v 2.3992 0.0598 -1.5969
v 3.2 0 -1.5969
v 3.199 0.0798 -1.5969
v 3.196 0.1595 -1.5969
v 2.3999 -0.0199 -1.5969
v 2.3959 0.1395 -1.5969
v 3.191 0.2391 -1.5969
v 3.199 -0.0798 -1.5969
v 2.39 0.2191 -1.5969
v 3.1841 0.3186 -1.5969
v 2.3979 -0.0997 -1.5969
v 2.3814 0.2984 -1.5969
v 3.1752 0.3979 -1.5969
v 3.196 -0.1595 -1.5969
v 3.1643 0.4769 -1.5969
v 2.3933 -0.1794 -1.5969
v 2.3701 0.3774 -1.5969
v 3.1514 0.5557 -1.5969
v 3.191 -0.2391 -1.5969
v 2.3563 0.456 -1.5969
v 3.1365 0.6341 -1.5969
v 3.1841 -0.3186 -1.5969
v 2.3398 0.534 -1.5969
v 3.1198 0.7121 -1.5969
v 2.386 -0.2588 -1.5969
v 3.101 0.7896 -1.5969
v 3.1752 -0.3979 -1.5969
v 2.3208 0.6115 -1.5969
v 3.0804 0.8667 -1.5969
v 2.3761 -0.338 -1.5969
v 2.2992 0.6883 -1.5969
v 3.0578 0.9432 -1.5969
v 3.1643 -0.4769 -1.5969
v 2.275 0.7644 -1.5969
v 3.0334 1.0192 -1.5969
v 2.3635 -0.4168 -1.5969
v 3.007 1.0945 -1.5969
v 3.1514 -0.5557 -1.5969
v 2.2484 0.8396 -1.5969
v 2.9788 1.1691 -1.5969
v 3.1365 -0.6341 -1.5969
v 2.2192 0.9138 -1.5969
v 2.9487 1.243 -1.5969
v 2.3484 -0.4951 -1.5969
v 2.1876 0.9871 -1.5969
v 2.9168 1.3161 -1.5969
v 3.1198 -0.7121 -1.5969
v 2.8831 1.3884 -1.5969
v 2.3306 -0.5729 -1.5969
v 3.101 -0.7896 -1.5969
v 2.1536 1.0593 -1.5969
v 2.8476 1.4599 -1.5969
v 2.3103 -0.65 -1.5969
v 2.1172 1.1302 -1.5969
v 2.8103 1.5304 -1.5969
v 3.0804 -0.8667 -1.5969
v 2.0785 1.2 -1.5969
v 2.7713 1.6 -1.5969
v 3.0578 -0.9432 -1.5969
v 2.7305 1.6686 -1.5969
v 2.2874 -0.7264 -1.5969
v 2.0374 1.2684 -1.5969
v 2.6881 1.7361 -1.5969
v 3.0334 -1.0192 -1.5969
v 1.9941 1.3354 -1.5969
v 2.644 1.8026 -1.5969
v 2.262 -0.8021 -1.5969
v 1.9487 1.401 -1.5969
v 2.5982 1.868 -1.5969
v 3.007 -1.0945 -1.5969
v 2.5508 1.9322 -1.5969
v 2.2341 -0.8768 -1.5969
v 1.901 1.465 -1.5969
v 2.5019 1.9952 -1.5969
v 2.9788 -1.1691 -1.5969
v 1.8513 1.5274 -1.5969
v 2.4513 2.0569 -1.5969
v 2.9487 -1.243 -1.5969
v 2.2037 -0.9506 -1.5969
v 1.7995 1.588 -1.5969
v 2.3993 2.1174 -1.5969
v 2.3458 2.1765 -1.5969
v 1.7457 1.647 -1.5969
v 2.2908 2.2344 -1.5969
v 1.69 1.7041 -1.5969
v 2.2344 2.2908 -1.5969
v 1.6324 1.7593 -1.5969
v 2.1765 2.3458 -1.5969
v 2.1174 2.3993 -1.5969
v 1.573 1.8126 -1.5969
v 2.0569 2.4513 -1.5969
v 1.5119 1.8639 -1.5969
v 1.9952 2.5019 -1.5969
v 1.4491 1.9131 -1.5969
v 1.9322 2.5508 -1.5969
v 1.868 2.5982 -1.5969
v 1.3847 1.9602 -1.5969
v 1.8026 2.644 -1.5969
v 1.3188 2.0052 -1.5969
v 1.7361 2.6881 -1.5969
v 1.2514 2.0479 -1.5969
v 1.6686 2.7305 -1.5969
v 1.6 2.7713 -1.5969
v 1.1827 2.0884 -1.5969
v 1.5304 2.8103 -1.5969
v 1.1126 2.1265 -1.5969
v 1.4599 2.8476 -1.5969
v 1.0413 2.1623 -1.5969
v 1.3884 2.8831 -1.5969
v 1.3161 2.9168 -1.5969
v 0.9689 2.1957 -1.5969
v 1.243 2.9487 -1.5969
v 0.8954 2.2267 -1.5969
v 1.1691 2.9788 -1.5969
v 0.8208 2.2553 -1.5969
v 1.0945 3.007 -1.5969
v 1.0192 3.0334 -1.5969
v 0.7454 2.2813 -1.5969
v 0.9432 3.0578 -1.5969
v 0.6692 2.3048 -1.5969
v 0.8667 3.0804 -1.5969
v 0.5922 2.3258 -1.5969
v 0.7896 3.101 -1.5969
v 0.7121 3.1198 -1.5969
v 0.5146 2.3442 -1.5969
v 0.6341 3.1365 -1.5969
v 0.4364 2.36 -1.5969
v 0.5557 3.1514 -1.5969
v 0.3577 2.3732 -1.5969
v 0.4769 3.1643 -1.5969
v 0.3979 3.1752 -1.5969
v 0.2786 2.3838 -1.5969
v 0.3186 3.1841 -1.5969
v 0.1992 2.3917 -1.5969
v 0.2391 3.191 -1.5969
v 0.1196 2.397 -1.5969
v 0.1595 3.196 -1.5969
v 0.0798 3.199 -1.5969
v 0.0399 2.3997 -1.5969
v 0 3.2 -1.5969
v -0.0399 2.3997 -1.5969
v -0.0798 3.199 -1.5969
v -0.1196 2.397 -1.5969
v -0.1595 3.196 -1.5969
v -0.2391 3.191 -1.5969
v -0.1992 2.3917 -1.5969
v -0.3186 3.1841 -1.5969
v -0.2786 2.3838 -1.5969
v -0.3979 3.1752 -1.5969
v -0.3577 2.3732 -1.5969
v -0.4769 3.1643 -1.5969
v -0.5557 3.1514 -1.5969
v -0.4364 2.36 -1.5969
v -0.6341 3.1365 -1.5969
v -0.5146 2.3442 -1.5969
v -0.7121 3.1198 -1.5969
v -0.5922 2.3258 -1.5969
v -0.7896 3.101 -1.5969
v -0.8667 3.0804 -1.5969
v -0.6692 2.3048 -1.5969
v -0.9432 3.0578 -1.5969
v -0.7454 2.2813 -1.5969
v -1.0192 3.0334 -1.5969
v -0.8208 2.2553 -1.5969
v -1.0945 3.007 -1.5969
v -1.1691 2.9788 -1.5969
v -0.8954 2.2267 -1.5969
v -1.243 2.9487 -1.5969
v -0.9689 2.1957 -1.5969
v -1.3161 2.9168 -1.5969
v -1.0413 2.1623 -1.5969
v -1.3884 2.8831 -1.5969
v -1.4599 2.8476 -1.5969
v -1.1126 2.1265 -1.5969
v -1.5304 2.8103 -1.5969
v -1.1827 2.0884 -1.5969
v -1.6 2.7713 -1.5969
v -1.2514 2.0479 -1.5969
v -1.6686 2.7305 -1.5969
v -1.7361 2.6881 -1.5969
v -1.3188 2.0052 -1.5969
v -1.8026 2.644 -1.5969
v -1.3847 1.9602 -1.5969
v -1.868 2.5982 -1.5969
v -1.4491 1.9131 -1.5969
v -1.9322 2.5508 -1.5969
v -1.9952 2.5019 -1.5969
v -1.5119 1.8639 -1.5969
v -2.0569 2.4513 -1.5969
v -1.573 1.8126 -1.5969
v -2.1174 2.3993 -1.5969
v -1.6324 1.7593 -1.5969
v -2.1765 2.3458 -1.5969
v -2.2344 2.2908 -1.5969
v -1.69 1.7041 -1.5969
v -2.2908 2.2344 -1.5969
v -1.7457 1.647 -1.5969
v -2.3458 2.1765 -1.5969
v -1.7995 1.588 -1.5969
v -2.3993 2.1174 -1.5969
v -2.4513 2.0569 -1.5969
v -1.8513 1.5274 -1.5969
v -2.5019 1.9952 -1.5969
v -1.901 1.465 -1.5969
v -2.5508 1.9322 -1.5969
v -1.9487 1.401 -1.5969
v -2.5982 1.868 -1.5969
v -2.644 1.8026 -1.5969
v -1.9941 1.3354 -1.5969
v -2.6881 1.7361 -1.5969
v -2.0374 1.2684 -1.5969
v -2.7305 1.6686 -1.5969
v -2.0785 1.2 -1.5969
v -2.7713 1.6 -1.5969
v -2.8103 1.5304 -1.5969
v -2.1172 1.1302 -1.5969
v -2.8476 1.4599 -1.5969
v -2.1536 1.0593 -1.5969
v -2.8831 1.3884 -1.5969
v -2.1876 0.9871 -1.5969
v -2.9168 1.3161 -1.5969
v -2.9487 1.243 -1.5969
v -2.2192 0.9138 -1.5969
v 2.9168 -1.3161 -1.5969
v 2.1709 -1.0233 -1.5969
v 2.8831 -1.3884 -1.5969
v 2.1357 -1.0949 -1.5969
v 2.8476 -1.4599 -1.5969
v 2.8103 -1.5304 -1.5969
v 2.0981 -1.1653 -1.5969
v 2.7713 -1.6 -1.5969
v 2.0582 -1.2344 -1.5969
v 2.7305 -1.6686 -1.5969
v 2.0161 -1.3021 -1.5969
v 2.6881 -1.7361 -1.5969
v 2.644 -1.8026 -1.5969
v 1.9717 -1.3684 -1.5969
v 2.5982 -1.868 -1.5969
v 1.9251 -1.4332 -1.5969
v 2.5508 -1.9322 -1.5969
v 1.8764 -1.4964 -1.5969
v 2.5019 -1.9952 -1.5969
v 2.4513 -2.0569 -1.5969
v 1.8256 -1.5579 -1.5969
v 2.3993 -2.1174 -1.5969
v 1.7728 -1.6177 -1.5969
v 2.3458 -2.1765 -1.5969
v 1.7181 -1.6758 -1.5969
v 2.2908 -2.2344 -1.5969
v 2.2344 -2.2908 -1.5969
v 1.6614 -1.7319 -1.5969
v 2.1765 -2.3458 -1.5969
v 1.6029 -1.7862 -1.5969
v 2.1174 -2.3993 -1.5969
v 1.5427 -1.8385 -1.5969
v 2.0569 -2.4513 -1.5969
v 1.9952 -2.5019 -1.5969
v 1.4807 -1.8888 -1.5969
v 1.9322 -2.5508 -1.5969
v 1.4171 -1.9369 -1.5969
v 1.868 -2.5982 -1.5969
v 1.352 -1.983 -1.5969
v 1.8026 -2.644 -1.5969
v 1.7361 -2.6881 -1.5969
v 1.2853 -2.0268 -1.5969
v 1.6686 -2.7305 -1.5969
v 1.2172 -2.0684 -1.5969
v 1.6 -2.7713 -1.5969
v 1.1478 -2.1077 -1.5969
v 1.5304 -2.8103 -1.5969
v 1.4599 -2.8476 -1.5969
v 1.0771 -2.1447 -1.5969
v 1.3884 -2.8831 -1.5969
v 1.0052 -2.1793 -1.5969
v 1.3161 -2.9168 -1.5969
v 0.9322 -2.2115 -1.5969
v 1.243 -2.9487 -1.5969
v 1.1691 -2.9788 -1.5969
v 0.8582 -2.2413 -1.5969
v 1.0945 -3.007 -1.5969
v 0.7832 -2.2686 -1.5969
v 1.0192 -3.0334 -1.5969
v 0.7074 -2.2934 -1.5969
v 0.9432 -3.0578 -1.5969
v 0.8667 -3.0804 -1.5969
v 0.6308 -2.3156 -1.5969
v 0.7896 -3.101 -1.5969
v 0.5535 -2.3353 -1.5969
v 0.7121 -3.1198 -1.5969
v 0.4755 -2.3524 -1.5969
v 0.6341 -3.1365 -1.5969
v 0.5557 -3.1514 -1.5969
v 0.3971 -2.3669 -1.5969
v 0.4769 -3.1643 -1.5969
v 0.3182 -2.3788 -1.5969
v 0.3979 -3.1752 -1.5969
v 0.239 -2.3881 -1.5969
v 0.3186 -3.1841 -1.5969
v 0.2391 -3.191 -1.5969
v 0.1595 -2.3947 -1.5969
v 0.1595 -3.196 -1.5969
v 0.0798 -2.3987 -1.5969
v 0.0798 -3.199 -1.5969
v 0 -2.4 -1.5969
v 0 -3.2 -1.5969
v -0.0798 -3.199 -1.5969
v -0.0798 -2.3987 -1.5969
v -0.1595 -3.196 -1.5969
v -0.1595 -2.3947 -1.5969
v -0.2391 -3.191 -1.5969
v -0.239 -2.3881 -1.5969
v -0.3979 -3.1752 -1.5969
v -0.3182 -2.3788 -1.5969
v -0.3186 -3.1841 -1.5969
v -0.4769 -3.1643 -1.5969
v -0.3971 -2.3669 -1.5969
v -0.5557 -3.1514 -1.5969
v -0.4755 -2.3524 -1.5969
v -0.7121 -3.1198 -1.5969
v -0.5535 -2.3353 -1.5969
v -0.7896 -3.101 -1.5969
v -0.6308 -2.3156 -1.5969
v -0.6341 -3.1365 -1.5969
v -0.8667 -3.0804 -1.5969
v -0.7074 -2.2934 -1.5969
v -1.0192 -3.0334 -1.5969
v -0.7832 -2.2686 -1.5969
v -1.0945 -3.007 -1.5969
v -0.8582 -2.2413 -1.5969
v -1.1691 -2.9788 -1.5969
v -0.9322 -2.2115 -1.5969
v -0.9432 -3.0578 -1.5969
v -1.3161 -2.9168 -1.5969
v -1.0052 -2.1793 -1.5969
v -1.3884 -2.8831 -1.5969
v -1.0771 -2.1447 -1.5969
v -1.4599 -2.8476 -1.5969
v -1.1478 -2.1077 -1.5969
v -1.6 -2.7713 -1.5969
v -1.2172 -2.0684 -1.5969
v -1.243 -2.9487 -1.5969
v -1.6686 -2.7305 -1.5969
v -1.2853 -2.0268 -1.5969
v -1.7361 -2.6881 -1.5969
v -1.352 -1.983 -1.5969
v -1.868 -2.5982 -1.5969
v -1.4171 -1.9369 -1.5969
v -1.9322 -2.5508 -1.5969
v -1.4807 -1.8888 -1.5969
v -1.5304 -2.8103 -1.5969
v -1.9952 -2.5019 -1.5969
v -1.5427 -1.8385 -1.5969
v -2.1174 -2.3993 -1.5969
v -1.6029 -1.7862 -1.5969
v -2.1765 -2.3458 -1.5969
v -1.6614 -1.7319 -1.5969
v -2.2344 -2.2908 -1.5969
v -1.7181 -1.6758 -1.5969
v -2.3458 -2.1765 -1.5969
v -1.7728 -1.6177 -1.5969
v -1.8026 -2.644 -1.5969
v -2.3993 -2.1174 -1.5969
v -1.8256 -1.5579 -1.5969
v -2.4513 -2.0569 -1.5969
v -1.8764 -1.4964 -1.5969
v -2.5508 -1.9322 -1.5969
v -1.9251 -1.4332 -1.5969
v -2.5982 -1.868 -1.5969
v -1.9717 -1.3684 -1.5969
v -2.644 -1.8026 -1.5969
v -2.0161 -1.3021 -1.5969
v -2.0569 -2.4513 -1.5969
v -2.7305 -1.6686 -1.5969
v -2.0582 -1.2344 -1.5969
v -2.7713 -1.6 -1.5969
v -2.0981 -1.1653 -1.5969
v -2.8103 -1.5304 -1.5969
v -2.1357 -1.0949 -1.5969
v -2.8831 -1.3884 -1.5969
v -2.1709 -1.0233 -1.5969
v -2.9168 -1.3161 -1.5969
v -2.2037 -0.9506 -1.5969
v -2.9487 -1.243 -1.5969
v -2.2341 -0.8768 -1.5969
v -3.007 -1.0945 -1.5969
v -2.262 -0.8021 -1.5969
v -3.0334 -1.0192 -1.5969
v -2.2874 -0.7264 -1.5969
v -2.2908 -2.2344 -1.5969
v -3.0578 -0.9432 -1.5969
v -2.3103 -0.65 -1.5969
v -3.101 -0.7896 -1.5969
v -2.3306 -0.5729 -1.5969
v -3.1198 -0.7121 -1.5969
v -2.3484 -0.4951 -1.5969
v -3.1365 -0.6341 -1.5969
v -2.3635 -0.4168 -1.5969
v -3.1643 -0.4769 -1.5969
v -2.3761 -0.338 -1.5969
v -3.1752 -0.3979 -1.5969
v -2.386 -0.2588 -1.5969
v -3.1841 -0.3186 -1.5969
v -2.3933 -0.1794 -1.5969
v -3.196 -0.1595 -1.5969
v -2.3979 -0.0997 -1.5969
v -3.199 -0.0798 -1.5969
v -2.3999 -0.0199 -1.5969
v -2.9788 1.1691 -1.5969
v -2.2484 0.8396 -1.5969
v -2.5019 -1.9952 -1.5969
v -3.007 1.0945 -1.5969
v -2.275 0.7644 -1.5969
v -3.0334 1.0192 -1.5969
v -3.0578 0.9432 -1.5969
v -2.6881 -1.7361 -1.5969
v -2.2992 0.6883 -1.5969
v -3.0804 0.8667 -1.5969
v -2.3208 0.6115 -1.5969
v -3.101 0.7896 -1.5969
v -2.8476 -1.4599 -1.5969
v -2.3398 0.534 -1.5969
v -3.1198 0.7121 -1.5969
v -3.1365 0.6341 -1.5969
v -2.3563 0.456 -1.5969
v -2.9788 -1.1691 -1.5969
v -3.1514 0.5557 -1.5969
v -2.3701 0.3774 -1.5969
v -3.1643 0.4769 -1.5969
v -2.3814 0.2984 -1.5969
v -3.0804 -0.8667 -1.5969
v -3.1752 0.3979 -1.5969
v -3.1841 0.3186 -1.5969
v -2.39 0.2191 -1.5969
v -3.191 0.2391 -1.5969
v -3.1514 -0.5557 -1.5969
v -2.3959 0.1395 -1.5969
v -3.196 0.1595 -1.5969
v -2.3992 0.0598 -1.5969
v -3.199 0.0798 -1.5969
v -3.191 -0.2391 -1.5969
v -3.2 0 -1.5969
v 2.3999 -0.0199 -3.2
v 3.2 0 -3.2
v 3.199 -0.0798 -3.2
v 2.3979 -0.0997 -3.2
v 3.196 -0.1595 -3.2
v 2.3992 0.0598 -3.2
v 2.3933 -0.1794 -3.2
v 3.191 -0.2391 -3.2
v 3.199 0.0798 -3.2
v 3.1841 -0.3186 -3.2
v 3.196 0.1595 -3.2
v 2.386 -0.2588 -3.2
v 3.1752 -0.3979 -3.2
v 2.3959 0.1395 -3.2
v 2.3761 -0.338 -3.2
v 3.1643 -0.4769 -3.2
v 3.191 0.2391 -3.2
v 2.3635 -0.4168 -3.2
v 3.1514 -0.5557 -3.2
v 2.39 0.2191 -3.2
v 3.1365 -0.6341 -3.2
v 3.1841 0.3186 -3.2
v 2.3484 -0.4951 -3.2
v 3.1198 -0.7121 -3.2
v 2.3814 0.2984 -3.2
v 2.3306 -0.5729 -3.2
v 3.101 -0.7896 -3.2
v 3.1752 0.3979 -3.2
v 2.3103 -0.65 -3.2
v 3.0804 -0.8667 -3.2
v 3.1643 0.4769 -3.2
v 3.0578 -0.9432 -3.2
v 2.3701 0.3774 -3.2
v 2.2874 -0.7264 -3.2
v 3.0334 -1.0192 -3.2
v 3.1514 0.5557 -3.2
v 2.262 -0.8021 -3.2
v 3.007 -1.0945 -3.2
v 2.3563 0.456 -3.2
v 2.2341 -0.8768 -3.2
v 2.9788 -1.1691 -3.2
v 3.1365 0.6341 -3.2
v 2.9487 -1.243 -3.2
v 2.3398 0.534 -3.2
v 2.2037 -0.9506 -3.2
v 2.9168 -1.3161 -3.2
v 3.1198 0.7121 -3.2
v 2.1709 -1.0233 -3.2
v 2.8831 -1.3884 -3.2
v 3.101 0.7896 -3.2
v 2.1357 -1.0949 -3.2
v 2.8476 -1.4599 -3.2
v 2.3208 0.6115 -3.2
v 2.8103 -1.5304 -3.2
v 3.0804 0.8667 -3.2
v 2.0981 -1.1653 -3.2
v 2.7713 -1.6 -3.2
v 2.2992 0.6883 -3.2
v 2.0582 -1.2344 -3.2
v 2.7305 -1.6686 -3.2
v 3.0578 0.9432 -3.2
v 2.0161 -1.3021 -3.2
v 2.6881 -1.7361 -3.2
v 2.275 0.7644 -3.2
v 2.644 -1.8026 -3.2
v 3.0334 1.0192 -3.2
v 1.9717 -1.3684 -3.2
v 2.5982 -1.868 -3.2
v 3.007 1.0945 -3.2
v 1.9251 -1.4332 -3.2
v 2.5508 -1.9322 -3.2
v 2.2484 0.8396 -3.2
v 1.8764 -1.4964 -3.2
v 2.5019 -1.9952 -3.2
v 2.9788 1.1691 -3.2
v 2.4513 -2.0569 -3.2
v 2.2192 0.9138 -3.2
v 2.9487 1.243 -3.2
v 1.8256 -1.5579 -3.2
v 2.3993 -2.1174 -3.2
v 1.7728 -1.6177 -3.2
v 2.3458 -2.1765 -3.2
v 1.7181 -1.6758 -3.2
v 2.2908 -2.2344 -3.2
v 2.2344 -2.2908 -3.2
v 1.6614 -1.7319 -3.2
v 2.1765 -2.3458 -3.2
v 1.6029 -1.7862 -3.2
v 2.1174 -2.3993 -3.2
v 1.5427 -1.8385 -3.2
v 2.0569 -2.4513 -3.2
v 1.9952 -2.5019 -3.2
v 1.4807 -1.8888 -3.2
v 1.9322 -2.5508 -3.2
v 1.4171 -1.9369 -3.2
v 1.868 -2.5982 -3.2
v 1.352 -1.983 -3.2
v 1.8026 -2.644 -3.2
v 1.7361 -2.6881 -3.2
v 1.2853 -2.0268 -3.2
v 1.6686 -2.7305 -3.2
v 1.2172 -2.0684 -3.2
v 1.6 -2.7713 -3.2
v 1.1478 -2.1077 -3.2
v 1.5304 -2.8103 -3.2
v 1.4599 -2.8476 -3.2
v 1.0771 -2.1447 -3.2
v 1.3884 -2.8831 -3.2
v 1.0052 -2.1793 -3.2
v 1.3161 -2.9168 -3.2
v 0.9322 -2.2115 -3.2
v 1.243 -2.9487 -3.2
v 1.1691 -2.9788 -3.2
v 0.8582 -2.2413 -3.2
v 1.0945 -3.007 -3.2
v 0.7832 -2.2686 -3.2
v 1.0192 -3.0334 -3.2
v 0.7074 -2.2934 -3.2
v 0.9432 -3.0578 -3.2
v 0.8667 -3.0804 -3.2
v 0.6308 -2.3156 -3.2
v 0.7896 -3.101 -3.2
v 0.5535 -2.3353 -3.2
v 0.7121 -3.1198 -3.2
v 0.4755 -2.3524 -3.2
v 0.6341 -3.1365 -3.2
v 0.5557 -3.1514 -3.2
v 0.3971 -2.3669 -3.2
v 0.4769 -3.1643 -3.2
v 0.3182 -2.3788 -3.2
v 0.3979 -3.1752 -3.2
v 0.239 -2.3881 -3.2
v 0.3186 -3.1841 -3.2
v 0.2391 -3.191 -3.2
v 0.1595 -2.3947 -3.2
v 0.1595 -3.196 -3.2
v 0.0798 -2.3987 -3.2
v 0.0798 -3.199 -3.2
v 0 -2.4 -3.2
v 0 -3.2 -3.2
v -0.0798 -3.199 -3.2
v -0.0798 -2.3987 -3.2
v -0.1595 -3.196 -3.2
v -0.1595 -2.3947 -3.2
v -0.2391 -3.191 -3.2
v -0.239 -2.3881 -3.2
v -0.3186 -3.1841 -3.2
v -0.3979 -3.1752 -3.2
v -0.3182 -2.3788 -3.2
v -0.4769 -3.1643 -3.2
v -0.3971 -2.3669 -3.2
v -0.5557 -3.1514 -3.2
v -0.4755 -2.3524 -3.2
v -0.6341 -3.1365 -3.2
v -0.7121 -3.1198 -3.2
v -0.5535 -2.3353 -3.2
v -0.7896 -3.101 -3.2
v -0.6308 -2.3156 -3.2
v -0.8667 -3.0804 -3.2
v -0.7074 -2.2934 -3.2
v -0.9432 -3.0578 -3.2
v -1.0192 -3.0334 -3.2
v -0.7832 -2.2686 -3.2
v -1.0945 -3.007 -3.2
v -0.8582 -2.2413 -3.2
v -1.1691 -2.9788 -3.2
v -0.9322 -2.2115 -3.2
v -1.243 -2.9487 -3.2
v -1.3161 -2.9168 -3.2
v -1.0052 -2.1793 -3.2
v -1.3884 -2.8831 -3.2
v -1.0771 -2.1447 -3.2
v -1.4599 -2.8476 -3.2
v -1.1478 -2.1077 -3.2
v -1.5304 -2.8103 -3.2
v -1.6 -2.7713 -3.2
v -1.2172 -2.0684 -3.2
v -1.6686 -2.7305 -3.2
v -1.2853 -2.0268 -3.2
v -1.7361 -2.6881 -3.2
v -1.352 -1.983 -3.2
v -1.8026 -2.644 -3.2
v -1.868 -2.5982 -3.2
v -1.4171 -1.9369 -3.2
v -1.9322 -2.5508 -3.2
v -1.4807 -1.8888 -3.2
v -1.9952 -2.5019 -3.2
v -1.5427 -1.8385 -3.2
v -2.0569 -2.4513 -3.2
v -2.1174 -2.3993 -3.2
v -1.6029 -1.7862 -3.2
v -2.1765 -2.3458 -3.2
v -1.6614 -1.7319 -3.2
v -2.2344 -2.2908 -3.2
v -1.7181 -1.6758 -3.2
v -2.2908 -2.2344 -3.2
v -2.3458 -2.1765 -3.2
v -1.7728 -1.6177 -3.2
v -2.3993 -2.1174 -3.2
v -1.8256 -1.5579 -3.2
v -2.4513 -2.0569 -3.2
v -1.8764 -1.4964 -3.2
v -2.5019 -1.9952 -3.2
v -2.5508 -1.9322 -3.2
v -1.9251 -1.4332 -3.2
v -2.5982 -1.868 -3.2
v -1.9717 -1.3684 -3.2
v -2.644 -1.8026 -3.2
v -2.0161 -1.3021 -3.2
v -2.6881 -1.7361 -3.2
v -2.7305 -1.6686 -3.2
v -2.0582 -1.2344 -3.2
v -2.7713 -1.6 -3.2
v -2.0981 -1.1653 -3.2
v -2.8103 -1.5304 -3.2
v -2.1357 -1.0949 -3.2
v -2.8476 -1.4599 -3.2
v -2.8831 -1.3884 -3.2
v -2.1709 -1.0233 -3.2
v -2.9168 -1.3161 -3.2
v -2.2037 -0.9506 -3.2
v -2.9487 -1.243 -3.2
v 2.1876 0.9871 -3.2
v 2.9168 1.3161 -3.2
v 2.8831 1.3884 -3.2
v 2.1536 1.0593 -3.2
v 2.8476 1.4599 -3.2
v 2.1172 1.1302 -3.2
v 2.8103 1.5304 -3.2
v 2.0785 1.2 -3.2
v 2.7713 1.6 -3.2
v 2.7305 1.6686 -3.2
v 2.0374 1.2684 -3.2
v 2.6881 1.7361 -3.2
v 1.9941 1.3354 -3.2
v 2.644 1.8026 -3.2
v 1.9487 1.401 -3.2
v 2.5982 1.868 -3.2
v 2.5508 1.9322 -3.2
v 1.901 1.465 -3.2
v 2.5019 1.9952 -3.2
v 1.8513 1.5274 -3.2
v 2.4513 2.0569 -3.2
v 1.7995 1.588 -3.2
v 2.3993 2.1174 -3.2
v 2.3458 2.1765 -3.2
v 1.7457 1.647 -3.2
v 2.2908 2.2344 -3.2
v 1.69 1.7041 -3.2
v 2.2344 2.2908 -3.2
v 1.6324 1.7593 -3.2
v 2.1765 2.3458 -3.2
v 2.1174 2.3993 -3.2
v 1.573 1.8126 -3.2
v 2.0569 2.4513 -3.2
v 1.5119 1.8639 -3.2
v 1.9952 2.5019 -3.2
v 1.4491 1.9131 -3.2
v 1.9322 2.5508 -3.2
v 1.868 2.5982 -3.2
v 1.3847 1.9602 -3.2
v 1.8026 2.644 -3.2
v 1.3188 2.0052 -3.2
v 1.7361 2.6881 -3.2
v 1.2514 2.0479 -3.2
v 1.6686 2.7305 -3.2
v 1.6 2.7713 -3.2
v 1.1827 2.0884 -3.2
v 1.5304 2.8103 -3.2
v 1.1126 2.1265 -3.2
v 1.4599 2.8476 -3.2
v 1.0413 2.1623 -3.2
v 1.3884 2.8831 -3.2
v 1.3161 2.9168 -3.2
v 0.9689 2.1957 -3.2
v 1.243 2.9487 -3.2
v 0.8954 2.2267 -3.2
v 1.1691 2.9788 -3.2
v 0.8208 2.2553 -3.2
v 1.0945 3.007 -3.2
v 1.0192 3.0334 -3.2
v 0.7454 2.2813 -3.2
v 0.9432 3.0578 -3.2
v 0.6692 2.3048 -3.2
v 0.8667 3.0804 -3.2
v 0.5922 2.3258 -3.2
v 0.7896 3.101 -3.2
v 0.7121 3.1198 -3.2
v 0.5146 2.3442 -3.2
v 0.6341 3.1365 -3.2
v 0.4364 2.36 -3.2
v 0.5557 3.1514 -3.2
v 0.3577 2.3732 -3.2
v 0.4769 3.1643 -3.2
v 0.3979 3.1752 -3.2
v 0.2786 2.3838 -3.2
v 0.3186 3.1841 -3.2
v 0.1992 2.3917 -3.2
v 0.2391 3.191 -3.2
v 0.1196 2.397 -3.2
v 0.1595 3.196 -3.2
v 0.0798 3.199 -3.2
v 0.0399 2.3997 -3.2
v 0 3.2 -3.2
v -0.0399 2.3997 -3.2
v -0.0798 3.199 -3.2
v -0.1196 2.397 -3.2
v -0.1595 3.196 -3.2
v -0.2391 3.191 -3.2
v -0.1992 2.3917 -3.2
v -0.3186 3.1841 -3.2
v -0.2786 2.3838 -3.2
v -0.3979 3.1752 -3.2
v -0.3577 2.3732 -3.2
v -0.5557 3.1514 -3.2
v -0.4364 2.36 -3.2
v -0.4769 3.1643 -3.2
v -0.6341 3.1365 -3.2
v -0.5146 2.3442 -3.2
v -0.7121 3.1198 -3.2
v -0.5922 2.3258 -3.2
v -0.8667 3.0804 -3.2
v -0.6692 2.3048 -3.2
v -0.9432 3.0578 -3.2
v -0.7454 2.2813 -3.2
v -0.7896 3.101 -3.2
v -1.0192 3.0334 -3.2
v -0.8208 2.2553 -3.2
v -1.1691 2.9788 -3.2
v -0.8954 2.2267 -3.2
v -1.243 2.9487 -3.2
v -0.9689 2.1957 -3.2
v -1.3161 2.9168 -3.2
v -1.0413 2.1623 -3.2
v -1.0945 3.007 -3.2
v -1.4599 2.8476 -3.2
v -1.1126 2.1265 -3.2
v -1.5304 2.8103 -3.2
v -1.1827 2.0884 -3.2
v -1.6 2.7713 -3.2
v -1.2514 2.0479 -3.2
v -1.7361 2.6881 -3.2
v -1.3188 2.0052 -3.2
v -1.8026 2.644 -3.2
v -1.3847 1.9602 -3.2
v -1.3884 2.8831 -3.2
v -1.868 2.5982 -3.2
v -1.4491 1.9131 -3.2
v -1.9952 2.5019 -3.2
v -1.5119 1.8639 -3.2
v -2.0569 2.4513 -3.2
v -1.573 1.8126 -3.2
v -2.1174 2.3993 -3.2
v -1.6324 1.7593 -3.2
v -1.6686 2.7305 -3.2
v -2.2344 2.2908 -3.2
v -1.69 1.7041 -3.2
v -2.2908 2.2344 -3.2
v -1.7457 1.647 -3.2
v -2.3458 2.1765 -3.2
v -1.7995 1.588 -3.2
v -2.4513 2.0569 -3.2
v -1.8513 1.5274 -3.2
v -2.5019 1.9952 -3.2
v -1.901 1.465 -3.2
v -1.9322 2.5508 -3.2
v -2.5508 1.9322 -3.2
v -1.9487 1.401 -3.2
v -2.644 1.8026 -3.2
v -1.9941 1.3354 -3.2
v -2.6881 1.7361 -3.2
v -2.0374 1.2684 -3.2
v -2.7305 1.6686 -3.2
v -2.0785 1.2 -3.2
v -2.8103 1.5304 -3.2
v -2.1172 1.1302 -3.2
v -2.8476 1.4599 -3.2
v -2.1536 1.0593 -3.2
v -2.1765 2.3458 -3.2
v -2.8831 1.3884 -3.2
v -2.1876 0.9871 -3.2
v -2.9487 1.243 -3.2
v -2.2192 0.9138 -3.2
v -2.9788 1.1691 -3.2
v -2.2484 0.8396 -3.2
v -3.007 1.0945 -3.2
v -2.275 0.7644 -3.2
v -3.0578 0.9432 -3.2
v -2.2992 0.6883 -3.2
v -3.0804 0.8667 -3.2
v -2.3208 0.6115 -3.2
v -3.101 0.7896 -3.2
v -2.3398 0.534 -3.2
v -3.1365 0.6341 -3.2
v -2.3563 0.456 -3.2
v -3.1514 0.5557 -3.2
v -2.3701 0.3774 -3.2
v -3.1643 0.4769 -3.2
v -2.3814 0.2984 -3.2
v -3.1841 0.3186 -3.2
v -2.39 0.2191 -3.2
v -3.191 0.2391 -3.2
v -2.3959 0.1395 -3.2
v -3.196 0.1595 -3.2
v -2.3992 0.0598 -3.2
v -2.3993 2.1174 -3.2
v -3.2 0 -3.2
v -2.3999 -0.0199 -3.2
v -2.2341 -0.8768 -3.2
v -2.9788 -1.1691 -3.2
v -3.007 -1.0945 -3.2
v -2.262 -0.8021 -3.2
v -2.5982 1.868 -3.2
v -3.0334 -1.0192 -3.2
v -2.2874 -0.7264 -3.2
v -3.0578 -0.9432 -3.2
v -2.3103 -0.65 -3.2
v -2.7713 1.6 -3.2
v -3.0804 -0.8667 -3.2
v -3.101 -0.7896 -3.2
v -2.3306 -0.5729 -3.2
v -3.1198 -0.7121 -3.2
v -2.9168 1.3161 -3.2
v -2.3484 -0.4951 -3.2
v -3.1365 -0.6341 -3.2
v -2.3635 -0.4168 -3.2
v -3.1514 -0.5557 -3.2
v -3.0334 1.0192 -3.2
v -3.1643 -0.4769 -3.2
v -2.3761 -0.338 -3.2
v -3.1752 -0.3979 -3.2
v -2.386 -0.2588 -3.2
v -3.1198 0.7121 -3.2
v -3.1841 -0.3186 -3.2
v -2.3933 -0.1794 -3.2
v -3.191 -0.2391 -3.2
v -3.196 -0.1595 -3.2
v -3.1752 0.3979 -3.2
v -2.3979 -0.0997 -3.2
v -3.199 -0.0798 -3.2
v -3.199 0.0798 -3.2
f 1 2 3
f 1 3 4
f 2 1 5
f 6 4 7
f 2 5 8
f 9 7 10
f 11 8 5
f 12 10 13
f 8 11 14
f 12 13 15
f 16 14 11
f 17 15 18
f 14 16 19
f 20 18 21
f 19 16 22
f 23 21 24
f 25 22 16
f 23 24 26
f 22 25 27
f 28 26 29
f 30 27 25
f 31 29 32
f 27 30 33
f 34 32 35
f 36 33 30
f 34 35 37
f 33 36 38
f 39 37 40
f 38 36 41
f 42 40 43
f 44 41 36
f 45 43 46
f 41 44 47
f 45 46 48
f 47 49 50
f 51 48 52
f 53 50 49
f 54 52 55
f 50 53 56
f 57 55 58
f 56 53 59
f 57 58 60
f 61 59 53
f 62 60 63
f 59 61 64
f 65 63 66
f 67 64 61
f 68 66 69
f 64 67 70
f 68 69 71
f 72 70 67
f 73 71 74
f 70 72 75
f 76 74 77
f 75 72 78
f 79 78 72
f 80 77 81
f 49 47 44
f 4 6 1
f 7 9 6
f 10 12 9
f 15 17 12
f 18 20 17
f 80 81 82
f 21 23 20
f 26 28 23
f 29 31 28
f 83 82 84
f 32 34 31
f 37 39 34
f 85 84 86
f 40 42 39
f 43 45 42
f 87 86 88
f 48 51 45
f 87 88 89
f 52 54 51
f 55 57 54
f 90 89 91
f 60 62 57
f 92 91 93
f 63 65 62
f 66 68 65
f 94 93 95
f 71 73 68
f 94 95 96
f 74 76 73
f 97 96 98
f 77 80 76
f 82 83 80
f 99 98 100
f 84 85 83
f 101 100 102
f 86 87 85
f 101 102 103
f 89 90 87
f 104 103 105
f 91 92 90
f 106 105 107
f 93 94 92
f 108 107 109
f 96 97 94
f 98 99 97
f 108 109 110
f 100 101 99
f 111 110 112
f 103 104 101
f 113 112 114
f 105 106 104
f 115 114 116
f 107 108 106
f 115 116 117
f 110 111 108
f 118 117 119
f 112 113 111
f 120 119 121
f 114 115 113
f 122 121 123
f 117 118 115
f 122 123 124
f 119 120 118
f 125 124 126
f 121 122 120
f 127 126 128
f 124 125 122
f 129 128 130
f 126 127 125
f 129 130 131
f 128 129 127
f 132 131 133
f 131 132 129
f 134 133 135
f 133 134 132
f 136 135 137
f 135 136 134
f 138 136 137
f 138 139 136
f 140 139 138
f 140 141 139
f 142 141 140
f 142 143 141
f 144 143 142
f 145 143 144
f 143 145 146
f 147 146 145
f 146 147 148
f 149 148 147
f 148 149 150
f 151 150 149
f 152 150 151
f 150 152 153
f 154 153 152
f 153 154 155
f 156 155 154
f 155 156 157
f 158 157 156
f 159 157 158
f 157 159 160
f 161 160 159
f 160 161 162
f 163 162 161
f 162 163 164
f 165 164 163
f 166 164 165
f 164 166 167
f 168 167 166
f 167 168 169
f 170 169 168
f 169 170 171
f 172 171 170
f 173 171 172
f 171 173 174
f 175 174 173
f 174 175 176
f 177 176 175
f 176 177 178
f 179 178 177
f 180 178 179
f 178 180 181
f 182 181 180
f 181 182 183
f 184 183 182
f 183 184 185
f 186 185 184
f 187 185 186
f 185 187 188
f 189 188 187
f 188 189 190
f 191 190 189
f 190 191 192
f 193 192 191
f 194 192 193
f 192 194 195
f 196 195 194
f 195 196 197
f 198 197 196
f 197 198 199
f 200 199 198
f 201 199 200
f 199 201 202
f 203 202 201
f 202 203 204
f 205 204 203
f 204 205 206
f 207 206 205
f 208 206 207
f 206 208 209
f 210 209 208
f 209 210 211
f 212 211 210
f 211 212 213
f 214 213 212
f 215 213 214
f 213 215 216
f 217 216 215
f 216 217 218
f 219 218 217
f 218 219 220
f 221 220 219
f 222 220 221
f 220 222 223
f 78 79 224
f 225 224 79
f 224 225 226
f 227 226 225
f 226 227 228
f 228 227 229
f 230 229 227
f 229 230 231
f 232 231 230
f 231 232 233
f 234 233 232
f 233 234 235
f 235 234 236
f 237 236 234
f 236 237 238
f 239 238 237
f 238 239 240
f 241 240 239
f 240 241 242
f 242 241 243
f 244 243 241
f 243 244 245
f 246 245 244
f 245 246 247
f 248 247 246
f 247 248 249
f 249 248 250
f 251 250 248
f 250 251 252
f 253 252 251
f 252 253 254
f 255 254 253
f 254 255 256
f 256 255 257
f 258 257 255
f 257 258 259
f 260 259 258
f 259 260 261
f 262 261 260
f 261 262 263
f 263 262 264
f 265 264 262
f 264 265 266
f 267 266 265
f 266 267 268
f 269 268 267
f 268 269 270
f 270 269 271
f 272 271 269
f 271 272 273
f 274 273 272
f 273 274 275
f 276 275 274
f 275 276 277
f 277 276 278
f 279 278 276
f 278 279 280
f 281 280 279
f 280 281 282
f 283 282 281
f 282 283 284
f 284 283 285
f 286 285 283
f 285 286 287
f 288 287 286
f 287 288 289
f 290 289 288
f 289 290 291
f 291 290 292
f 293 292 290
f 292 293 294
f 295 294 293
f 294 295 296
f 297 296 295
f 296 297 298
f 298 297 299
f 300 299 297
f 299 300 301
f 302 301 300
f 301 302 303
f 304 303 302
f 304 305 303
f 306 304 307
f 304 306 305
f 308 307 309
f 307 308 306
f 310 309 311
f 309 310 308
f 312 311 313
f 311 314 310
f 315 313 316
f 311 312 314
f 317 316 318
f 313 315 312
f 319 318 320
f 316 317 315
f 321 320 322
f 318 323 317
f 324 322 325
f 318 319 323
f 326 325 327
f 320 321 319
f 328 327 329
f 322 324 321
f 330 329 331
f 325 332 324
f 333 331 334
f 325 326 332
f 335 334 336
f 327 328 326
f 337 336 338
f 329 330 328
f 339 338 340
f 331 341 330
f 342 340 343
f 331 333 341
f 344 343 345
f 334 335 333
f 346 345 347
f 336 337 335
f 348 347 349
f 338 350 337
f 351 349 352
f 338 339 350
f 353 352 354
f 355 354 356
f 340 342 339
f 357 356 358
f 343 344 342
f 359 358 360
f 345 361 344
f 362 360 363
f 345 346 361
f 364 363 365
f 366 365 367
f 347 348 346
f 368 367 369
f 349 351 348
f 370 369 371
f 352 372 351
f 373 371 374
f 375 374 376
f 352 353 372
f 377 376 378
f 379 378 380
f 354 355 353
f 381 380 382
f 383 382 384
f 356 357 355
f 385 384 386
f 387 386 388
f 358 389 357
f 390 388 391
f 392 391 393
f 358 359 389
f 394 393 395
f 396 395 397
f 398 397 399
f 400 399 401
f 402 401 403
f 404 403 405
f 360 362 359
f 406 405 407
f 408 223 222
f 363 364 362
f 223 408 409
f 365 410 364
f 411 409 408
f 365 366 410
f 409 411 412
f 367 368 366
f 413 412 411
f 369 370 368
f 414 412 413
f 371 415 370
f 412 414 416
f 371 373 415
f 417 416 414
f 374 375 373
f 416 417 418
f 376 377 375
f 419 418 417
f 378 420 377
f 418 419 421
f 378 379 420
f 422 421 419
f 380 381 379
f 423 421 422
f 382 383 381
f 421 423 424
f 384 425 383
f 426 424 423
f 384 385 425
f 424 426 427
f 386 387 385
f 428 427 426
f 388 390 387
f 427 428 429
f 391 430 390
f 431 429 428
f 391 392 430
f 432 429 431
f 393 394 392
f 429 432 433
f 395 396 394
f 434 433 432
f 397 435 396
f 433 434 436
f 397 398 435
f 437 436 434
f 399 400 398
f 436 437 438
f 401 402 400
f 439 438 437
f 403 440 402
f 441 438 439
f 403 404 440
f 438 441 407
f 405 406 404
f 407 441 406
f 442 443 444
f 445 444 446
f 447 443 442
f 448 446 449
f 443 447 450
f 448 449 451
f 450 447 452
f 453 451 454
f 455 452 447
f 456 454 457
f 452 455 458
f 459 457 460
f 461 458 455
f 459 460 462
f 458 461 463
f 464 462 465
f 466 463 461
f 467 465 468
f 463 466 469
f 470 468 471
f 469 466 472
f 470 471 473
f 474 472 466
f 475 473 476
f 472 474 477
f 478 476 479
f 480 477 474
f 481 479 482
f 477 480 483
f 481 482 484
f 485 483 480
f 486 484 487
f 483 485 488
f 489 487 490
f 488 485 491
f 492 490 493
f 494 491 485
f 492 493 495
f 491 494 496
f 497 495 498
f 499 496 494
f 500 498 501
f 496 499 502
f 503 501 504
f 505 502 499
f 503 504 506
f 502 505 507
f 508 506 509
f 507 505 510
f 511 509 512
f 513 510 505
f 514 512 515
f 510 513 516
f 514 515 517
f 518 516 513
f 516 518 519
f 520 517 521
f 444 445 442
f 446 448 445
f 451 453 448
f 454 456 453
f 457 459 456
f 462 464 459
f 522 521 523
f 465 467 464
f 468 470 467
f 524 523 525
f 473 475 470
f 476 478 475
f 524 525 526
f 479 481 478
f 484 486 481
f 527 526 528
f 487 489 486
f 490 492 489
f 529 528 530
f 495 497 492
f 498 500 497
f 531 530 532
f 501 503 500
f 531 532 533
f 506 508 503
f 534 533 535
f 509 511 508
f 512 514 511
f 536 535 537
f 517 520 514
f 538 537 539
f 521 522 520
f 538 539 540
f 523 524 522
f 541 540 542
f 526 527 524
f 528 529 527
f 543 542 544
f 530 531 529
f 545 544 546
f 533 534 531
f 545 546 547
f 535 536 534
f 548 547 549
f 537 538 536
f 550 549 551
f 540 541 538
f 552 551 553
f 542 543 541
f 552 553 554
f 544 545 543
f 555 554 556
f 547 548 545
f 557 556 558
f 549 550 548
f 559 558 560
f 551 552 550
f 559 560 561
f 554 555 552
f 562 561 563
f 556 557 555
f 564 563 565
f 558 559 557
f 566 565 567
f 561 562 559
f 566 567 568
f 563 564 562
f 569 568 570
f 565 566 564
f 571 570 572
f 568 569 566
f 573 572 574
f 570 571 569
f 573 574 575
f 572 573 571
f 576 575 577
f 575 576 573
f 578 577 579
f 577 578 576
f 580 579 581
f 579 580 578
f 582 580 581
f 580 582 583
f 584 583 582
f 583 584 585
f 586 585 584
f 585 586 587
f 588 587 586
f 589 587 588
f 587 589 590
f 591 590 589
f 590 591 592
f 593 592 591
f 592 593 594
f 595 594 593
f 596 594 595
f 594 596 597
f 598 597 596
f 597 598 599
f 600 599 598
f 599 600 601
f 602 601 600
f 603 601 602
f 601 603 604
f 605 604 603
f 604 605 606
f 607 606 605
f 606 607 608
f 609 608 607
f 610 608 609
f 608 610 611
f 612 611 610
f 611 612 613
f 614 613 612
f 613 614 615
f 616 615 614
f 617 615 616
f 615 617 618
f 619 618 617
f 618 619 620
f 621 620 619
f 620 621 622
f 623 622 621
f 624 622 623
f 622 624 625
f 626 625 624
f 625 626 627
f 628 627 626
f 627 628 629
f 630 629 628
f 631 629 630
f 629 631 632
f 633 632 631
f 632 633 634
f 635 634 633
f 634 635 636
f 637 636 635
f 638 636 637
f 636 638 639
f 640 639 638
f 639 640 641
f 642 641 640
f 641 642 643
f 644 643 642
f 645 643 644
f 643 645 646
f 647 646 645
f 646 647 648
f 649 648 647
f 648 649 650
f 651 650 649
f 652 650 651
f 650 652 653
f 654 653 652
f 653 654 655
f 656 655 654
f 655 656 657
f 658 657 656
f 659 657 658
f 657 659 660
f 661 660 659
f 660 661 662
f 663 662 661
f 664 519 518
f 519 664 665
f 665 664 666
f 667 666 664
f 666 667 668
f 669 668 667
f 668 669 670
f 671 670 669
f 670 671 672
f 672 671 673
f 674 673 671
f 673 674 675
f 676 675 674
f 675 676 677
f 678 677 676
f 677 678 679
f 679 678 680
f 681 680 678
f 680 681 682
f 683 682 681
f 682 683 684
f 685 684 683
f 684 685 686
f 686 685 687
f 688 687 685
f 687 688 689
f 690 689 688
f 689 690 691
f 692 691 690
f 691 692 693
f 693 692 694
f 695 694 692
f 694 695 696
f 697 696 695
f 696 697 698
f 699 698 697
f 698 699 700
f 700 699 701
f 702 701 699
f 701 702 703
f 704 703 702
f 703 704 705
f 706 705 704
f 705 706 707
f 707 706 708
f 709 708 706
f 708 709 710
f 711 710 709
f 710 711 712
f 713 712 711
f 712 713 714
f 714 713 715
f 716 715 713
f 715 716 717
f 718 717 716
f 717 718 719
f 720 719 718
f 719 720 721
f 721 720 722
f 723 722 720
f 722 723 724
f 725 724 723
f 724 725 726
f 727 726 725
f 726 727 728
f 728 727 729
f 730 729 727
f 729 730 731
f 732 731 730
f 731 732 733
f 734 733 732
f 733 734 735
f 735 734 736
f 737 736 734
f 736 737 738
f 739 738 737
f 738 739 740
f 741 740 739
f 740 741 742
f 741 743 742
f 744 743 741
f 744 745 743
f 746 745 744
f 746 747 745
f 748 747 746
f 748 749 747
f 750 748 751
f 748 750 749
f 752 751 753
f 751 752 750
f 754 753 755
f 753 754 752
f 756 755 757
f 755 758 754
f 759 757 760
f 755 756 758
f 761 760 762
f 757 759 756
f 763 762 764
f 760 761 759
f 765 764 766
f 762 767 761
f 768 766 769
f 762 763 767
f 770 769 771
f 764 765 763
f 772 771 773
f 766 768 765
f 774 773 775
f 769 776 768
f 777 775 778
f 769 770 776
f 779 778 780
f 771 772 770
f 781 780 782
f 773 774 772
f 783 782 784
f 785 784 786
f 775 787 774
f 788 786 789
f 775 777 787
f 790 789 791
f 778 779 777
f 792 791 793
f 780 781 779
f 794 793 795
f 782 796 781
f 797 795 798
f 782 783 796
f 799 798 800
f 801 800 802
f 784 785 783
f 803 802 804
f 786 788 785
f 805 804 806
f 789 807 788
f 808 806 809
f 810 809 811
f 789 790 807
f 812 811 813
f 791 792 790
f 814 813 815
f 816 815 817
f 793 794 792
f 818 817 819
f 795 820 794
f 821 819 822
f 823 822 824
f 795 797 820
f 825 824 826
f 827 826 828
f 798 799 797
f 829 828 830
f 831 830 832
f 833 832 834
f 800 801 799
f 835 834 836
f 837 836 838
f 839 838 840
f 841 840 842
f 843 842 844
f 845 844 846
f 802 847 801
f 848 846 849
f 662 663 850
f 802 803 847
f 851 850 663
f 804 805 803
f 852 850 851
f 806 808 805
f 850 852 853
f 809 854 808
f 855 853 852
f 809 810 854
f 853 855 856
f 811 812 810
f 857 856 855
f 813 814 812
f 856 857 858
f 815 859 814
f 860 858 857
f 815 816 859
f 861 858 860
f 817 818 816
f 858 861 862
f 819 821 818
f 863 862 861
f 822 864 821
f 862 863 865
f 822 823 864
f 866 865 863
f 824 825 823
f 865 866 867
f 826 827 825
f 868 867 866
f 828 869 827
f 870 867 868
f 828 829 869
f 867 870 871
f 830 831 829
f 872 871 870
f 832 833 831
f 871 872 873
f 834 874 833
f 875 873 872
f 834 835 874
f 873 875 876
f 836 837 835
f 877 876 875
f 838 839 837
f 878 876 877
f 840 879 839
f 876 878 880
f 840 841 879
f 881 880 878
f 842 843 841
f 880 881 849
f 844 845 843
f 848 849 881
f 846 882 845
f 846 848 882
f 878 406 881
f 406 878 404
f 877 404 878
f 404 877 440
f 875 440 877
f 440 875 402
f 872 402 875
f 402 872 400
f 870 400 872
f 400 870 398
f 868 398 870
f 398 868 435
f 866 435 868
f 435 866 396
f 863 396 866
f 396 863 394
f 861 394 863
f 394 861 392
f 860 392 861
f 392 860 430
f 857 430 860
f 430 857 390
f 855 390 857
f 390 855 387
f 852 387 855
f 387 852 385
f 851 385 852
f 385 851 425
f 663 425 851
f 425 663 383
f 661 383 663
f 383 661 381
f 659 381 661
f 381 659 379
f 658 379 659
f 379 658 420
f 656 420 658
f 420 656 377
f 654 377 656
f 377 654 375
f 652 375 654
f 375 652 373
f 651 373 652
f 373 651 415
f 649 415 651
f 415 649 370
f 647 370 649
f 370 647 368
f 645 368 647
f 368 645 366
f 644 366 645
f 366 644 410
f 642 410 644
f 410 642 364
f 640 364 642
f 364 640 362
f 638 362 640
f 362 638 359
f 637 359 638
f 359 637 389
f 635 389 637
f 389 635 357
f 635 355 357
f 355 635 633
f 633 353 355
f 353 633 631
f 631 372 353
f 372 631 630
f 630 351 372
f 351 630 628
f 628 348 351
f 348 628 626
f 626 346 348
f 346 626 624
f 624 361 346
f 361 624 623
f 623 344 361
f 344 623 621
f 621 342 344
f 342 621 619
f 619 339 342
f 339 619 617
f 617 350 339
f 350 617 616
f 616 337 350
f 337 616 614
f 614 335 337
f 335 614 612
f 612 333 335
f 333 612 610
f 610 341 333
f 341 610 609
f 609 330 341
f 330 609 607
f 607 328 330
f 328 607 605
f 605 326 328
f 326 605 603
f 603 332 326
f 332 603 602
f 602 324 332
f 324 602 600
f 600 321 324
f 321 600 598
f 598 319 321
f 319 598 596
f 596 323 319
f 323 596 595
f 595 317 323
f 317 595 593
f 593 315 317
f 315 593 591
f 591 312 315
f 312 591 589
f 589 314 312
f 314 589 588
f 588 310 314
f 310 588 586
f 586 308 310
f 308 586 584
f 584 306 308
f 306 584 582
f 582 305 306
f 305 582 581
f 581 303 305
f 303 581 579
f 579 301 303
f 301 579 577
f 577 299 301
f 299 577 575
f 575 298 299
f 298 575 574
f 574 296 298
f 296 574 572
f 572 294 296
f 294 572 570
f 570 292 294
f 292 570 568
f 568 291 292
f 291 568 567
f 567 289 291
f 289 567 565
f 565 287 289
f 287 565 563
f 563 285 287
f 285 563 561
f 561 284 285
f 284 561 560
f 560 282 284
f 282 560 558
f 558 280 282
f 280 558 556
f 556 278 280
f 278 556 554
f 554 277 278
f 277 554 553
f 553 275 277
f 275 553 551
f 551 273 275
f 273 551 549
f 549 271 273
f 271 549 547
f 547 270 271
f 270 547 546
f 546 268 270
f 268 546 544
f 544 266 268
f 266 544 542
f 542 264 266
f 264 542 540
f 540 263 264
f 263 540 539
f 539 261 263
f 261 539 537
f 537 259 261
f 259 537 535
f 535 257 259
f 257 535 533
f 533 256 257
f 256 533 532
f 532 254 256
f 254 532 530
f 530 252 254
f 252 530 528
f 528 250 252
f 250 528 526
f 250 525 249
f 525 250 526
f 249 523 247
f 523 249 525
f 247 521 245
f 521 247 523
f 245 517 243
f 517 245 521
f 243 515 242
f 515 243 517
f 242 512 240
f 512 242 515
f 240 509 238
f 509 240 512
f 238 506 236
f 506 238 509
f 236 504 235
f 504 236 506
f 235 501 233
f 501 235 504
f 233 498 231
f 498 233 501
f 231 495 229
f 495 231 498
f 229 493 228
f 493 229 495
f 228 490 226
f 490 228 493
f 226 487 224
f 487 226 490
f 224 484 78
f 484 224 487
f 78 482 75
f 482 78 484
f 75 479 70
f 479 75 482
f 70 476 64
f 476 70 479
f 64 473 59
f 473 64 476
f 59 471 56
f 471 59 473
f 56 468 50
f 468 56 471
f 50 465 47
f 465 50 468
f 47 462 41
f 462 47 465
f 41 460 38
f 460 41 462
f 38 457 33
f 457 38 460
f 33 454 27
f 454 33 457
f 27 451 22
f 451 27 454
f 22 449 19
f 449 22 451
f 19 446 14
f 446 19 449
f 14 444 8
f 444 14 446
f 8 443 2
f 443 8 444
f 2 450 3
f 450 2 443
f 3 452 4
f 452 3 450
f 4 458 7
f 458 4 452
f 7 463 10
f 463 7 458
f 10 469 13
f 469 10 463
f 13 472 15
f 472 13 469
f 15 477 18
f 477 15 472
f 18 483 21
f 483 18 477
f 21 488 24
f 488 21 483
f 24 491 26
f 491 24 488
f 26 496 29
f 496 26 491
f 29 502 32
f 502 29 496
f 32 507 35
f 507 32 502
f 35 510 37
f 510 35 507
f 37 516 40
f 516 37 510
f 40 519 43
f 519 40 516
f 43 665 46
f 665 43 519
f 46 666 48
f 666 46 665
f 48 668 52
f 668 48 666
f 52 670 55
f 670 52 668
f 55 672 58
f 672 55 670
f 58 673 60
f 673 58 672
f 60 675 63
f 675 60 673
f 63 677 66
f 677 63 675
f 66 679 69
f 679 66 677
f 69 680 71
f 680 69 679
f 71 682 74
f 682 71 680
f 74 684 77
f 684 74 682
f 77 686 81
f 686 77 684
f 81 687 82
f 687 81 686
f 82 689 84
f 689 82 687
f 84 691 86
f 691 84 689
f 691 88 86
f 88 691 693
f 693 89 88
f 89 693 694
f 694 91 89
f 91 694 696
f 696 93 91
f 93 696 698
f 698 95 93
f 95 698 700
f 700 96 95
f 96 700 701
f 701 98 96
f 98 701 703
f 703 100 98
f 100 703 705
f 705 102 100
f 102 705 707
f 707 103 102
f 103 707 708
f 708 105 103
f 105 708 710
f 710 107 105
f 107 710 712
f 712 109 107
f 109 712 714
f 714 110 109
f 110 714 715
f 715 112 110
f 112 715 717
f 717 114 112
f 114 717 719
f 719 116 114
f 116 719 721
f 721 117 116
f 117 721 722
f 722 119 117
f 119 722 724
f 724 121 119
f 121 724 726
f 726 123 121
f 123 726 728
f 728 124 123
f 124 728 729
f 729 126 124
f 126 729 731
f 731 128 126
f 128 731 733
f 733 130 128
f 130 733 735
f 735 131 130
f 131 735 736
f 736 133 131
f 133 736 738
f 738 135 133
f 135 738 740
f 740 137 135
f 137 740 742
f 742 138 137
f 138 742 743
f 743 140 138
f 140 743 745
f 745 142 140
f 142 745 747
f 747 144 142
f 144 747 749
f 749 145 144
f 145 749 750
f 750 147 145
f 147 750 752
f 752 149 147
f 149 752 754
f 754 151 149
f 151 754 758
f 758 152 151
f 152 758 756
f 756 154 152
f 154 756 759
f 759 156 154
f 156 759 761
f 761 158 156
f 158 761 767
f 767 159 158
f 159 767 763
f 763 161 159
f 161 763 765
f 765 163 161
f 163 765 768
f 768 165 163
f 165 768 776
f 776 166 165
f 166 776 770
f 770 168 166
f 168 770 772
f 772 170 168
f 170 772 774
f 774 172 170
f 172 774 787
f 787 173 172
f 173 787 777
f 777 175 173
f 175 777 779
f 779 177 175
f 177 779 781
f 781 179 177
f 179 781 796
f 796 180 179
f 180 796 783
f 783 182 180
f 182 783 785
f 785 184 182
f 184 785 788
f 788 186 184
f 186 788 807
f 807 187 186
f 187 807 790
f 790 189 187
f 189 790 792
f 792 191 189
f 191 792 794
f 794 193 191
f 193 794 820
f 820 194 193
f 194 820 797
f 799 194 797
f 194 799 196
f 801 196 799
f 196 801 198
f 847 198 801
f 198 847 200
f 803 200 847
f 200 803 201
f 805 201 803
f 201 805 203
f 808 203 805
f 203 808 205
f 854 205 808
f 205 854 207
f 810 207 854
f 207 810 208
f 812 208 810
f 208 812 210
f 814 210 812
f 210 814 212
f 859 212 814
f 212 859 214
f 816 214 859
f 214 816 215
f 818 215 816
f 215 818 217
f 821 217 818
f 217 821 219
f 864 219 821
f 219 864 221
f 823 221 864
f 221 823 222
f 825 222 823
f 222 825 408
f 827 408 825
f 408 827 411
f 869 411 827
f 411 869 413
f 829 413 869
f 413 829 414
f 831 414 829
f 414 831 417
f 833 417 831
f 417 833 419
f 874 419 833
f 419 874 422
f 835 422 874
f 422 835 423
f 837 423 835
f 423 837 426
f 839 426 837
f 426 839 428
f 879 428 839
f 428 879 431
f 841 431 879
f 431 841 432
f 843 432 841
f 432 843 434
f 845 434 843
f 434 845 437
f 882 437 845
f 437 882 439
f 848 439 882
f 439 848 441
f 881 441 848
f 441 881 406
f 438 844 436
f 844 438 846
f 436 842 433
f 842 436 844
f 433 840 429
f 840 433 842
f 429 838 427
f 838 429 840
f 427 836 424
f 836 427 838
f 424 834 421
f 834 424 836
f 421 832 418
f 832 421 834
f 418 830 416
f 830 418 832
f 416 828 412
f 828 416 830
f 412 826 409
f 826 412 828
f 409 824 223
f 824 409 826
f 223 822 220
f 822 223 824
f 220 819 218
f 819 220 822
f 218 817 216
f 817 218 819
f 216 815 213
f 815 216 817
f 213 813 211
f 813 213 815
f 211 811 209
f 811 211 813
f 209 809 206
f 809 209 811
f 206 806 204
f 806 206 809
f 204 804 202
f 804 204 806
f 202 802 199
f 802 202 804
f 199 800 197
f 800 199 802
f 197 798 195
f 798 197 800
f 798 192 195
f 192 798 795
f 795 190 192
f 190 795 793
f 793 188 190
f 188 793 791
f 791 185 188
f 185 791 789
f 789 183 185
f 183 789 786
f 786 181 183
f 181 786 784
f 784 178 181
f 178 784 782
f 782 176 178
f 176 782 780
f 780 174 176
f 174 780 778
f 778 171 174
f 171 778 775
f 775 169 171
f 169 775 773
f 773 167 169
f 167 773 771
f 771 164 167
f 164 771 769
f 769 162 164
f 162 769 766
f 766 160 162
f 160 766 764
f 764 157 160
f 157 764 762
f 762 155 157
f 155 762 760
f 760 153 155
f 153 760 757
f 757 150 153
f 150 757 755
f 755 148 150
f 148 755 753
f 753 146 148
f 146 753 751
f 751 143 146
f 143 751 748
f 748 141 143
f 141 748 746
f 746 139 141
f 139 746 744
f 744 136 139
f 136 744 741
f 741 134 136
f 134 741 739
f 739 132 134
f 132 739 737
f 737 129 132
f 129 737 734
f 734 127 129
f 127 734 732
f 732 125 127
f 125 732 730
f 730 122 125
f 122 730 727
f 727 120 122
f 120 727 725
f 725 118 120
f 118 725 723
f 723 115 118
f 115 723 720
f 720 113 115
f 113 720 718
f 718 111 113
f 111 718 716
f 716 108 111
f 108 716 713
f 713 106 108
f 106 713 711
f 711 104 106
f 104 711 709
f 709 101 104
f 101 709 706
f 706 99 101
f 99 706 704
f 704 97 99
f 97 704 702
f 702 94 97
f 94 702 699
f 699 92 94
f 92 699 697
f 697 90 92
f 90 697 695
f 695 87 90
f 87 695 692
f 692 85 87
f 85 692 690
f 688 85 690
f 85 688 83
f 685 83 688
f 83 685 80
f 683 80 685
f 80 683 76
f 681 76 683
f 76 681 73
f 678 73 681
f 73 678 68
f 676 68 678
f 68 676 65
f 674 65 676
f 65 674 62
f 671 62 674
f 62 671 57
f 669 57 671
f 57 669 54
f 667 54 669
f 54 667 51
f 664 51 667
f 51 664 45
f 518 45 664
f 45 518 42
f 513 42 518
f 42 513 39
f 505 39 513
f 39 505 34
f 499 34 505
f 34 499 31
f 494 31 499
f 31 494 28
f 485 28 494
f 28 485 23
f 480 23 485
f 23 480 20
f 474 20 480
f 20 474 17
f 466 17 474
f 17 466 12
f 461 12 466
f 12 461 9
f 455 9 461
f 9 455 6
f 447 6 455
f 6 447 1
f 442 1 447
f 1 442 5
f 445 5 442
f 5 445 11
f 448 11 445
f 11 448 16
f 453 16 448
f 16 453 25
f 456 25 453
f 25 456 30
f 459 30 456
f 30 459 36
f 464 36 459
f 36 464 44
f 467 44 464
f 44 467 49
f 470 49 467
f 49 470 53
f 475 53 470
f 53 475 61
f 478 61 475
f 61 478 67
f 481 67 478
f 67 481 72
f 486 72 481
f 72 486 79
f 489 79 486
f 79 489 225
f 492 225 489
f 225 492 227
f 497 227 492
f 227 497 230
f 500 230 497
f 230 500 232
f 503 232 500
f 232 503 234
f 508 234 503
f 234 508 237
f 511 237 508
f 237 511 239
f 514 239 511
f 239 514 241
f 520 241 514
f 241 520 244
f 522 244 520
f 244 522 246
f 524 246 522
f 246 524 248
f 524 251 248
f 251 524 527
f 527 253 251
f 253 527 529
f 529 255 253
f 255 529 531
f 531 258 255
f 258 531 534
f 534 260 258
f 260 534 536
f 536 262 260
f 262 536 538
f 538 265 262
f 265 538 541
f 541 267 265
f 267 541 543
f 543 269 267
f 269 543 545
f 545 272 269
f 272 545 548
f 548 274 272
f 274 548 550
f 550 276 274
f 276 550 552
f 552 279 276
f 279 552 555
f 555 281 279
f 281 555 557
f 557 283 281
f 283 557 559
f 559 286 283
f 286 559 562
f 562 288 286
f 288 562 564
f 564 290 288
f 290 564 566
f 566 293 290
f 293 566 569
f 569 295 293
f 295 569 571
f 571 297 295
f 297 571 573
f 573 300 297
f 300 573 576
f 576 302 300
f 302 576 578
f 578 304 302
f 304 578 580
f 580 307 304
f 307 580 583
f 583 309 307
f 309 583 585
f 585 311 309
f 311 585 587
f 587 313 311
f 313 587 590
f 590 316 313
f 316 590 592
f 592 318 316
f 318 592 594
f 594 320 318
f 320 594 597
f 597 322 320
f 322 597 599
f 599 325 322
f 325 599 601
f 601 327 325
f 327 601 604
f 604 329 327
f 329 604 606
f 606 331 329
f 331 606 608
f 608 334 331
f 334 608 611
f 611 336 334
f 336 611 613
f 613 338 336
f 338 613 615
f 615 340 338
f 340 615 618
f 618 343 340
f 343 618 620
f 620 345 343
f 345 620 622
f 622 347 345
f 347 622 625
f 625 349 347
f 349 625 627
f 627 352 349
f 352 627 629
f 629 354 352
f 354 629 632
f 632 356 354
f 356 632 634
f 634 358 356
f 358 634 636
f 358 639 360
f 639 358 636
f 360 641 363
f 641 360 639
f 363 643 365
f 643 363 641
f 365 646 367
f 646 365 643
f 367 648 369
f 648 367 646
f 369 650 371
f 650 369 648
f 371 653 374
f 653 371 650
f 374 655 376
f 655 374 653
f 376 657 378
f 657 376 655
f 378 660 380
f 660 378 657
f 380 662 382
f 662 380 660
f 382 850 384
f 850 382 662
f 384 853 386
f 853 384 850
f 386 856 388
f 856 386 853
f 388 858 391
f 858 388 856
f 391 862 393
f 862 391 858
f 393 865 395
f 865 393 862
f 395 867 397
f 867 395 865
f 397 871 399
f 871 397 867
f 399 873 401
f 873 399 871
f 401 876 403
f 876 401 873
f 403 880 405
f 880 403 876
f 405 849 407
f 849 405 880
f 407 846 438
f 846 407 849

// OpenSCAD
use <../lib.scad>
use <../p/4-4disc.scad>
use <s/14769s01.scad>
$fa=1; $fs=0.2;
function ldraw_lib__14769(realsolid=false) = [
// 0 Tile  2 x  2 Round with Round Underside Stud
// 0 Name: 14769.dat
// 0 Author: Max Martin Richter [MMR1988]
// 0 !LDRAW_ORG Part UPDATE 2014-02
// 0 !LICENSE Licensed under CC BY 2.0 and CC BY 4.0 : see CAreadme.txt
// 
// 0 BFC CERTIFY CCW
  [0,"BFC","CERTIFY"],
  [0,"BFC","CCW"],
// 
// 0 !HISTORY 2014-12-23 [PTadmin] Official Update 2014-02
// 
// 
// 1 16 0 0 0 1 0 0 0 1 0 0 0 1 s\14769s01.dat
  [1,16,0,0,0,1,0,0,0,1,0,0,0,1, ldraw_lib__s__14769s01(realsolid)],
// 1 16 0 0 0 20 0 0 0 1 0 0 0 20 4-4disc.dat
  [1,16,0,0,0,20,0,0,0,1,0,0,0,20, ldraw_lib__4_4disc(realsolid)],
];
module ldraw_lib__14769(step=0, col=false, unit=2/5, alt=false, line=0.2, solid=!$preview)
    makepoly(ldraw_lib__14769(solid), step=step, col=col, unit=unit, alt=alt, line=line, solid=solid);
ldraw_lib__14769(line=0.2);
